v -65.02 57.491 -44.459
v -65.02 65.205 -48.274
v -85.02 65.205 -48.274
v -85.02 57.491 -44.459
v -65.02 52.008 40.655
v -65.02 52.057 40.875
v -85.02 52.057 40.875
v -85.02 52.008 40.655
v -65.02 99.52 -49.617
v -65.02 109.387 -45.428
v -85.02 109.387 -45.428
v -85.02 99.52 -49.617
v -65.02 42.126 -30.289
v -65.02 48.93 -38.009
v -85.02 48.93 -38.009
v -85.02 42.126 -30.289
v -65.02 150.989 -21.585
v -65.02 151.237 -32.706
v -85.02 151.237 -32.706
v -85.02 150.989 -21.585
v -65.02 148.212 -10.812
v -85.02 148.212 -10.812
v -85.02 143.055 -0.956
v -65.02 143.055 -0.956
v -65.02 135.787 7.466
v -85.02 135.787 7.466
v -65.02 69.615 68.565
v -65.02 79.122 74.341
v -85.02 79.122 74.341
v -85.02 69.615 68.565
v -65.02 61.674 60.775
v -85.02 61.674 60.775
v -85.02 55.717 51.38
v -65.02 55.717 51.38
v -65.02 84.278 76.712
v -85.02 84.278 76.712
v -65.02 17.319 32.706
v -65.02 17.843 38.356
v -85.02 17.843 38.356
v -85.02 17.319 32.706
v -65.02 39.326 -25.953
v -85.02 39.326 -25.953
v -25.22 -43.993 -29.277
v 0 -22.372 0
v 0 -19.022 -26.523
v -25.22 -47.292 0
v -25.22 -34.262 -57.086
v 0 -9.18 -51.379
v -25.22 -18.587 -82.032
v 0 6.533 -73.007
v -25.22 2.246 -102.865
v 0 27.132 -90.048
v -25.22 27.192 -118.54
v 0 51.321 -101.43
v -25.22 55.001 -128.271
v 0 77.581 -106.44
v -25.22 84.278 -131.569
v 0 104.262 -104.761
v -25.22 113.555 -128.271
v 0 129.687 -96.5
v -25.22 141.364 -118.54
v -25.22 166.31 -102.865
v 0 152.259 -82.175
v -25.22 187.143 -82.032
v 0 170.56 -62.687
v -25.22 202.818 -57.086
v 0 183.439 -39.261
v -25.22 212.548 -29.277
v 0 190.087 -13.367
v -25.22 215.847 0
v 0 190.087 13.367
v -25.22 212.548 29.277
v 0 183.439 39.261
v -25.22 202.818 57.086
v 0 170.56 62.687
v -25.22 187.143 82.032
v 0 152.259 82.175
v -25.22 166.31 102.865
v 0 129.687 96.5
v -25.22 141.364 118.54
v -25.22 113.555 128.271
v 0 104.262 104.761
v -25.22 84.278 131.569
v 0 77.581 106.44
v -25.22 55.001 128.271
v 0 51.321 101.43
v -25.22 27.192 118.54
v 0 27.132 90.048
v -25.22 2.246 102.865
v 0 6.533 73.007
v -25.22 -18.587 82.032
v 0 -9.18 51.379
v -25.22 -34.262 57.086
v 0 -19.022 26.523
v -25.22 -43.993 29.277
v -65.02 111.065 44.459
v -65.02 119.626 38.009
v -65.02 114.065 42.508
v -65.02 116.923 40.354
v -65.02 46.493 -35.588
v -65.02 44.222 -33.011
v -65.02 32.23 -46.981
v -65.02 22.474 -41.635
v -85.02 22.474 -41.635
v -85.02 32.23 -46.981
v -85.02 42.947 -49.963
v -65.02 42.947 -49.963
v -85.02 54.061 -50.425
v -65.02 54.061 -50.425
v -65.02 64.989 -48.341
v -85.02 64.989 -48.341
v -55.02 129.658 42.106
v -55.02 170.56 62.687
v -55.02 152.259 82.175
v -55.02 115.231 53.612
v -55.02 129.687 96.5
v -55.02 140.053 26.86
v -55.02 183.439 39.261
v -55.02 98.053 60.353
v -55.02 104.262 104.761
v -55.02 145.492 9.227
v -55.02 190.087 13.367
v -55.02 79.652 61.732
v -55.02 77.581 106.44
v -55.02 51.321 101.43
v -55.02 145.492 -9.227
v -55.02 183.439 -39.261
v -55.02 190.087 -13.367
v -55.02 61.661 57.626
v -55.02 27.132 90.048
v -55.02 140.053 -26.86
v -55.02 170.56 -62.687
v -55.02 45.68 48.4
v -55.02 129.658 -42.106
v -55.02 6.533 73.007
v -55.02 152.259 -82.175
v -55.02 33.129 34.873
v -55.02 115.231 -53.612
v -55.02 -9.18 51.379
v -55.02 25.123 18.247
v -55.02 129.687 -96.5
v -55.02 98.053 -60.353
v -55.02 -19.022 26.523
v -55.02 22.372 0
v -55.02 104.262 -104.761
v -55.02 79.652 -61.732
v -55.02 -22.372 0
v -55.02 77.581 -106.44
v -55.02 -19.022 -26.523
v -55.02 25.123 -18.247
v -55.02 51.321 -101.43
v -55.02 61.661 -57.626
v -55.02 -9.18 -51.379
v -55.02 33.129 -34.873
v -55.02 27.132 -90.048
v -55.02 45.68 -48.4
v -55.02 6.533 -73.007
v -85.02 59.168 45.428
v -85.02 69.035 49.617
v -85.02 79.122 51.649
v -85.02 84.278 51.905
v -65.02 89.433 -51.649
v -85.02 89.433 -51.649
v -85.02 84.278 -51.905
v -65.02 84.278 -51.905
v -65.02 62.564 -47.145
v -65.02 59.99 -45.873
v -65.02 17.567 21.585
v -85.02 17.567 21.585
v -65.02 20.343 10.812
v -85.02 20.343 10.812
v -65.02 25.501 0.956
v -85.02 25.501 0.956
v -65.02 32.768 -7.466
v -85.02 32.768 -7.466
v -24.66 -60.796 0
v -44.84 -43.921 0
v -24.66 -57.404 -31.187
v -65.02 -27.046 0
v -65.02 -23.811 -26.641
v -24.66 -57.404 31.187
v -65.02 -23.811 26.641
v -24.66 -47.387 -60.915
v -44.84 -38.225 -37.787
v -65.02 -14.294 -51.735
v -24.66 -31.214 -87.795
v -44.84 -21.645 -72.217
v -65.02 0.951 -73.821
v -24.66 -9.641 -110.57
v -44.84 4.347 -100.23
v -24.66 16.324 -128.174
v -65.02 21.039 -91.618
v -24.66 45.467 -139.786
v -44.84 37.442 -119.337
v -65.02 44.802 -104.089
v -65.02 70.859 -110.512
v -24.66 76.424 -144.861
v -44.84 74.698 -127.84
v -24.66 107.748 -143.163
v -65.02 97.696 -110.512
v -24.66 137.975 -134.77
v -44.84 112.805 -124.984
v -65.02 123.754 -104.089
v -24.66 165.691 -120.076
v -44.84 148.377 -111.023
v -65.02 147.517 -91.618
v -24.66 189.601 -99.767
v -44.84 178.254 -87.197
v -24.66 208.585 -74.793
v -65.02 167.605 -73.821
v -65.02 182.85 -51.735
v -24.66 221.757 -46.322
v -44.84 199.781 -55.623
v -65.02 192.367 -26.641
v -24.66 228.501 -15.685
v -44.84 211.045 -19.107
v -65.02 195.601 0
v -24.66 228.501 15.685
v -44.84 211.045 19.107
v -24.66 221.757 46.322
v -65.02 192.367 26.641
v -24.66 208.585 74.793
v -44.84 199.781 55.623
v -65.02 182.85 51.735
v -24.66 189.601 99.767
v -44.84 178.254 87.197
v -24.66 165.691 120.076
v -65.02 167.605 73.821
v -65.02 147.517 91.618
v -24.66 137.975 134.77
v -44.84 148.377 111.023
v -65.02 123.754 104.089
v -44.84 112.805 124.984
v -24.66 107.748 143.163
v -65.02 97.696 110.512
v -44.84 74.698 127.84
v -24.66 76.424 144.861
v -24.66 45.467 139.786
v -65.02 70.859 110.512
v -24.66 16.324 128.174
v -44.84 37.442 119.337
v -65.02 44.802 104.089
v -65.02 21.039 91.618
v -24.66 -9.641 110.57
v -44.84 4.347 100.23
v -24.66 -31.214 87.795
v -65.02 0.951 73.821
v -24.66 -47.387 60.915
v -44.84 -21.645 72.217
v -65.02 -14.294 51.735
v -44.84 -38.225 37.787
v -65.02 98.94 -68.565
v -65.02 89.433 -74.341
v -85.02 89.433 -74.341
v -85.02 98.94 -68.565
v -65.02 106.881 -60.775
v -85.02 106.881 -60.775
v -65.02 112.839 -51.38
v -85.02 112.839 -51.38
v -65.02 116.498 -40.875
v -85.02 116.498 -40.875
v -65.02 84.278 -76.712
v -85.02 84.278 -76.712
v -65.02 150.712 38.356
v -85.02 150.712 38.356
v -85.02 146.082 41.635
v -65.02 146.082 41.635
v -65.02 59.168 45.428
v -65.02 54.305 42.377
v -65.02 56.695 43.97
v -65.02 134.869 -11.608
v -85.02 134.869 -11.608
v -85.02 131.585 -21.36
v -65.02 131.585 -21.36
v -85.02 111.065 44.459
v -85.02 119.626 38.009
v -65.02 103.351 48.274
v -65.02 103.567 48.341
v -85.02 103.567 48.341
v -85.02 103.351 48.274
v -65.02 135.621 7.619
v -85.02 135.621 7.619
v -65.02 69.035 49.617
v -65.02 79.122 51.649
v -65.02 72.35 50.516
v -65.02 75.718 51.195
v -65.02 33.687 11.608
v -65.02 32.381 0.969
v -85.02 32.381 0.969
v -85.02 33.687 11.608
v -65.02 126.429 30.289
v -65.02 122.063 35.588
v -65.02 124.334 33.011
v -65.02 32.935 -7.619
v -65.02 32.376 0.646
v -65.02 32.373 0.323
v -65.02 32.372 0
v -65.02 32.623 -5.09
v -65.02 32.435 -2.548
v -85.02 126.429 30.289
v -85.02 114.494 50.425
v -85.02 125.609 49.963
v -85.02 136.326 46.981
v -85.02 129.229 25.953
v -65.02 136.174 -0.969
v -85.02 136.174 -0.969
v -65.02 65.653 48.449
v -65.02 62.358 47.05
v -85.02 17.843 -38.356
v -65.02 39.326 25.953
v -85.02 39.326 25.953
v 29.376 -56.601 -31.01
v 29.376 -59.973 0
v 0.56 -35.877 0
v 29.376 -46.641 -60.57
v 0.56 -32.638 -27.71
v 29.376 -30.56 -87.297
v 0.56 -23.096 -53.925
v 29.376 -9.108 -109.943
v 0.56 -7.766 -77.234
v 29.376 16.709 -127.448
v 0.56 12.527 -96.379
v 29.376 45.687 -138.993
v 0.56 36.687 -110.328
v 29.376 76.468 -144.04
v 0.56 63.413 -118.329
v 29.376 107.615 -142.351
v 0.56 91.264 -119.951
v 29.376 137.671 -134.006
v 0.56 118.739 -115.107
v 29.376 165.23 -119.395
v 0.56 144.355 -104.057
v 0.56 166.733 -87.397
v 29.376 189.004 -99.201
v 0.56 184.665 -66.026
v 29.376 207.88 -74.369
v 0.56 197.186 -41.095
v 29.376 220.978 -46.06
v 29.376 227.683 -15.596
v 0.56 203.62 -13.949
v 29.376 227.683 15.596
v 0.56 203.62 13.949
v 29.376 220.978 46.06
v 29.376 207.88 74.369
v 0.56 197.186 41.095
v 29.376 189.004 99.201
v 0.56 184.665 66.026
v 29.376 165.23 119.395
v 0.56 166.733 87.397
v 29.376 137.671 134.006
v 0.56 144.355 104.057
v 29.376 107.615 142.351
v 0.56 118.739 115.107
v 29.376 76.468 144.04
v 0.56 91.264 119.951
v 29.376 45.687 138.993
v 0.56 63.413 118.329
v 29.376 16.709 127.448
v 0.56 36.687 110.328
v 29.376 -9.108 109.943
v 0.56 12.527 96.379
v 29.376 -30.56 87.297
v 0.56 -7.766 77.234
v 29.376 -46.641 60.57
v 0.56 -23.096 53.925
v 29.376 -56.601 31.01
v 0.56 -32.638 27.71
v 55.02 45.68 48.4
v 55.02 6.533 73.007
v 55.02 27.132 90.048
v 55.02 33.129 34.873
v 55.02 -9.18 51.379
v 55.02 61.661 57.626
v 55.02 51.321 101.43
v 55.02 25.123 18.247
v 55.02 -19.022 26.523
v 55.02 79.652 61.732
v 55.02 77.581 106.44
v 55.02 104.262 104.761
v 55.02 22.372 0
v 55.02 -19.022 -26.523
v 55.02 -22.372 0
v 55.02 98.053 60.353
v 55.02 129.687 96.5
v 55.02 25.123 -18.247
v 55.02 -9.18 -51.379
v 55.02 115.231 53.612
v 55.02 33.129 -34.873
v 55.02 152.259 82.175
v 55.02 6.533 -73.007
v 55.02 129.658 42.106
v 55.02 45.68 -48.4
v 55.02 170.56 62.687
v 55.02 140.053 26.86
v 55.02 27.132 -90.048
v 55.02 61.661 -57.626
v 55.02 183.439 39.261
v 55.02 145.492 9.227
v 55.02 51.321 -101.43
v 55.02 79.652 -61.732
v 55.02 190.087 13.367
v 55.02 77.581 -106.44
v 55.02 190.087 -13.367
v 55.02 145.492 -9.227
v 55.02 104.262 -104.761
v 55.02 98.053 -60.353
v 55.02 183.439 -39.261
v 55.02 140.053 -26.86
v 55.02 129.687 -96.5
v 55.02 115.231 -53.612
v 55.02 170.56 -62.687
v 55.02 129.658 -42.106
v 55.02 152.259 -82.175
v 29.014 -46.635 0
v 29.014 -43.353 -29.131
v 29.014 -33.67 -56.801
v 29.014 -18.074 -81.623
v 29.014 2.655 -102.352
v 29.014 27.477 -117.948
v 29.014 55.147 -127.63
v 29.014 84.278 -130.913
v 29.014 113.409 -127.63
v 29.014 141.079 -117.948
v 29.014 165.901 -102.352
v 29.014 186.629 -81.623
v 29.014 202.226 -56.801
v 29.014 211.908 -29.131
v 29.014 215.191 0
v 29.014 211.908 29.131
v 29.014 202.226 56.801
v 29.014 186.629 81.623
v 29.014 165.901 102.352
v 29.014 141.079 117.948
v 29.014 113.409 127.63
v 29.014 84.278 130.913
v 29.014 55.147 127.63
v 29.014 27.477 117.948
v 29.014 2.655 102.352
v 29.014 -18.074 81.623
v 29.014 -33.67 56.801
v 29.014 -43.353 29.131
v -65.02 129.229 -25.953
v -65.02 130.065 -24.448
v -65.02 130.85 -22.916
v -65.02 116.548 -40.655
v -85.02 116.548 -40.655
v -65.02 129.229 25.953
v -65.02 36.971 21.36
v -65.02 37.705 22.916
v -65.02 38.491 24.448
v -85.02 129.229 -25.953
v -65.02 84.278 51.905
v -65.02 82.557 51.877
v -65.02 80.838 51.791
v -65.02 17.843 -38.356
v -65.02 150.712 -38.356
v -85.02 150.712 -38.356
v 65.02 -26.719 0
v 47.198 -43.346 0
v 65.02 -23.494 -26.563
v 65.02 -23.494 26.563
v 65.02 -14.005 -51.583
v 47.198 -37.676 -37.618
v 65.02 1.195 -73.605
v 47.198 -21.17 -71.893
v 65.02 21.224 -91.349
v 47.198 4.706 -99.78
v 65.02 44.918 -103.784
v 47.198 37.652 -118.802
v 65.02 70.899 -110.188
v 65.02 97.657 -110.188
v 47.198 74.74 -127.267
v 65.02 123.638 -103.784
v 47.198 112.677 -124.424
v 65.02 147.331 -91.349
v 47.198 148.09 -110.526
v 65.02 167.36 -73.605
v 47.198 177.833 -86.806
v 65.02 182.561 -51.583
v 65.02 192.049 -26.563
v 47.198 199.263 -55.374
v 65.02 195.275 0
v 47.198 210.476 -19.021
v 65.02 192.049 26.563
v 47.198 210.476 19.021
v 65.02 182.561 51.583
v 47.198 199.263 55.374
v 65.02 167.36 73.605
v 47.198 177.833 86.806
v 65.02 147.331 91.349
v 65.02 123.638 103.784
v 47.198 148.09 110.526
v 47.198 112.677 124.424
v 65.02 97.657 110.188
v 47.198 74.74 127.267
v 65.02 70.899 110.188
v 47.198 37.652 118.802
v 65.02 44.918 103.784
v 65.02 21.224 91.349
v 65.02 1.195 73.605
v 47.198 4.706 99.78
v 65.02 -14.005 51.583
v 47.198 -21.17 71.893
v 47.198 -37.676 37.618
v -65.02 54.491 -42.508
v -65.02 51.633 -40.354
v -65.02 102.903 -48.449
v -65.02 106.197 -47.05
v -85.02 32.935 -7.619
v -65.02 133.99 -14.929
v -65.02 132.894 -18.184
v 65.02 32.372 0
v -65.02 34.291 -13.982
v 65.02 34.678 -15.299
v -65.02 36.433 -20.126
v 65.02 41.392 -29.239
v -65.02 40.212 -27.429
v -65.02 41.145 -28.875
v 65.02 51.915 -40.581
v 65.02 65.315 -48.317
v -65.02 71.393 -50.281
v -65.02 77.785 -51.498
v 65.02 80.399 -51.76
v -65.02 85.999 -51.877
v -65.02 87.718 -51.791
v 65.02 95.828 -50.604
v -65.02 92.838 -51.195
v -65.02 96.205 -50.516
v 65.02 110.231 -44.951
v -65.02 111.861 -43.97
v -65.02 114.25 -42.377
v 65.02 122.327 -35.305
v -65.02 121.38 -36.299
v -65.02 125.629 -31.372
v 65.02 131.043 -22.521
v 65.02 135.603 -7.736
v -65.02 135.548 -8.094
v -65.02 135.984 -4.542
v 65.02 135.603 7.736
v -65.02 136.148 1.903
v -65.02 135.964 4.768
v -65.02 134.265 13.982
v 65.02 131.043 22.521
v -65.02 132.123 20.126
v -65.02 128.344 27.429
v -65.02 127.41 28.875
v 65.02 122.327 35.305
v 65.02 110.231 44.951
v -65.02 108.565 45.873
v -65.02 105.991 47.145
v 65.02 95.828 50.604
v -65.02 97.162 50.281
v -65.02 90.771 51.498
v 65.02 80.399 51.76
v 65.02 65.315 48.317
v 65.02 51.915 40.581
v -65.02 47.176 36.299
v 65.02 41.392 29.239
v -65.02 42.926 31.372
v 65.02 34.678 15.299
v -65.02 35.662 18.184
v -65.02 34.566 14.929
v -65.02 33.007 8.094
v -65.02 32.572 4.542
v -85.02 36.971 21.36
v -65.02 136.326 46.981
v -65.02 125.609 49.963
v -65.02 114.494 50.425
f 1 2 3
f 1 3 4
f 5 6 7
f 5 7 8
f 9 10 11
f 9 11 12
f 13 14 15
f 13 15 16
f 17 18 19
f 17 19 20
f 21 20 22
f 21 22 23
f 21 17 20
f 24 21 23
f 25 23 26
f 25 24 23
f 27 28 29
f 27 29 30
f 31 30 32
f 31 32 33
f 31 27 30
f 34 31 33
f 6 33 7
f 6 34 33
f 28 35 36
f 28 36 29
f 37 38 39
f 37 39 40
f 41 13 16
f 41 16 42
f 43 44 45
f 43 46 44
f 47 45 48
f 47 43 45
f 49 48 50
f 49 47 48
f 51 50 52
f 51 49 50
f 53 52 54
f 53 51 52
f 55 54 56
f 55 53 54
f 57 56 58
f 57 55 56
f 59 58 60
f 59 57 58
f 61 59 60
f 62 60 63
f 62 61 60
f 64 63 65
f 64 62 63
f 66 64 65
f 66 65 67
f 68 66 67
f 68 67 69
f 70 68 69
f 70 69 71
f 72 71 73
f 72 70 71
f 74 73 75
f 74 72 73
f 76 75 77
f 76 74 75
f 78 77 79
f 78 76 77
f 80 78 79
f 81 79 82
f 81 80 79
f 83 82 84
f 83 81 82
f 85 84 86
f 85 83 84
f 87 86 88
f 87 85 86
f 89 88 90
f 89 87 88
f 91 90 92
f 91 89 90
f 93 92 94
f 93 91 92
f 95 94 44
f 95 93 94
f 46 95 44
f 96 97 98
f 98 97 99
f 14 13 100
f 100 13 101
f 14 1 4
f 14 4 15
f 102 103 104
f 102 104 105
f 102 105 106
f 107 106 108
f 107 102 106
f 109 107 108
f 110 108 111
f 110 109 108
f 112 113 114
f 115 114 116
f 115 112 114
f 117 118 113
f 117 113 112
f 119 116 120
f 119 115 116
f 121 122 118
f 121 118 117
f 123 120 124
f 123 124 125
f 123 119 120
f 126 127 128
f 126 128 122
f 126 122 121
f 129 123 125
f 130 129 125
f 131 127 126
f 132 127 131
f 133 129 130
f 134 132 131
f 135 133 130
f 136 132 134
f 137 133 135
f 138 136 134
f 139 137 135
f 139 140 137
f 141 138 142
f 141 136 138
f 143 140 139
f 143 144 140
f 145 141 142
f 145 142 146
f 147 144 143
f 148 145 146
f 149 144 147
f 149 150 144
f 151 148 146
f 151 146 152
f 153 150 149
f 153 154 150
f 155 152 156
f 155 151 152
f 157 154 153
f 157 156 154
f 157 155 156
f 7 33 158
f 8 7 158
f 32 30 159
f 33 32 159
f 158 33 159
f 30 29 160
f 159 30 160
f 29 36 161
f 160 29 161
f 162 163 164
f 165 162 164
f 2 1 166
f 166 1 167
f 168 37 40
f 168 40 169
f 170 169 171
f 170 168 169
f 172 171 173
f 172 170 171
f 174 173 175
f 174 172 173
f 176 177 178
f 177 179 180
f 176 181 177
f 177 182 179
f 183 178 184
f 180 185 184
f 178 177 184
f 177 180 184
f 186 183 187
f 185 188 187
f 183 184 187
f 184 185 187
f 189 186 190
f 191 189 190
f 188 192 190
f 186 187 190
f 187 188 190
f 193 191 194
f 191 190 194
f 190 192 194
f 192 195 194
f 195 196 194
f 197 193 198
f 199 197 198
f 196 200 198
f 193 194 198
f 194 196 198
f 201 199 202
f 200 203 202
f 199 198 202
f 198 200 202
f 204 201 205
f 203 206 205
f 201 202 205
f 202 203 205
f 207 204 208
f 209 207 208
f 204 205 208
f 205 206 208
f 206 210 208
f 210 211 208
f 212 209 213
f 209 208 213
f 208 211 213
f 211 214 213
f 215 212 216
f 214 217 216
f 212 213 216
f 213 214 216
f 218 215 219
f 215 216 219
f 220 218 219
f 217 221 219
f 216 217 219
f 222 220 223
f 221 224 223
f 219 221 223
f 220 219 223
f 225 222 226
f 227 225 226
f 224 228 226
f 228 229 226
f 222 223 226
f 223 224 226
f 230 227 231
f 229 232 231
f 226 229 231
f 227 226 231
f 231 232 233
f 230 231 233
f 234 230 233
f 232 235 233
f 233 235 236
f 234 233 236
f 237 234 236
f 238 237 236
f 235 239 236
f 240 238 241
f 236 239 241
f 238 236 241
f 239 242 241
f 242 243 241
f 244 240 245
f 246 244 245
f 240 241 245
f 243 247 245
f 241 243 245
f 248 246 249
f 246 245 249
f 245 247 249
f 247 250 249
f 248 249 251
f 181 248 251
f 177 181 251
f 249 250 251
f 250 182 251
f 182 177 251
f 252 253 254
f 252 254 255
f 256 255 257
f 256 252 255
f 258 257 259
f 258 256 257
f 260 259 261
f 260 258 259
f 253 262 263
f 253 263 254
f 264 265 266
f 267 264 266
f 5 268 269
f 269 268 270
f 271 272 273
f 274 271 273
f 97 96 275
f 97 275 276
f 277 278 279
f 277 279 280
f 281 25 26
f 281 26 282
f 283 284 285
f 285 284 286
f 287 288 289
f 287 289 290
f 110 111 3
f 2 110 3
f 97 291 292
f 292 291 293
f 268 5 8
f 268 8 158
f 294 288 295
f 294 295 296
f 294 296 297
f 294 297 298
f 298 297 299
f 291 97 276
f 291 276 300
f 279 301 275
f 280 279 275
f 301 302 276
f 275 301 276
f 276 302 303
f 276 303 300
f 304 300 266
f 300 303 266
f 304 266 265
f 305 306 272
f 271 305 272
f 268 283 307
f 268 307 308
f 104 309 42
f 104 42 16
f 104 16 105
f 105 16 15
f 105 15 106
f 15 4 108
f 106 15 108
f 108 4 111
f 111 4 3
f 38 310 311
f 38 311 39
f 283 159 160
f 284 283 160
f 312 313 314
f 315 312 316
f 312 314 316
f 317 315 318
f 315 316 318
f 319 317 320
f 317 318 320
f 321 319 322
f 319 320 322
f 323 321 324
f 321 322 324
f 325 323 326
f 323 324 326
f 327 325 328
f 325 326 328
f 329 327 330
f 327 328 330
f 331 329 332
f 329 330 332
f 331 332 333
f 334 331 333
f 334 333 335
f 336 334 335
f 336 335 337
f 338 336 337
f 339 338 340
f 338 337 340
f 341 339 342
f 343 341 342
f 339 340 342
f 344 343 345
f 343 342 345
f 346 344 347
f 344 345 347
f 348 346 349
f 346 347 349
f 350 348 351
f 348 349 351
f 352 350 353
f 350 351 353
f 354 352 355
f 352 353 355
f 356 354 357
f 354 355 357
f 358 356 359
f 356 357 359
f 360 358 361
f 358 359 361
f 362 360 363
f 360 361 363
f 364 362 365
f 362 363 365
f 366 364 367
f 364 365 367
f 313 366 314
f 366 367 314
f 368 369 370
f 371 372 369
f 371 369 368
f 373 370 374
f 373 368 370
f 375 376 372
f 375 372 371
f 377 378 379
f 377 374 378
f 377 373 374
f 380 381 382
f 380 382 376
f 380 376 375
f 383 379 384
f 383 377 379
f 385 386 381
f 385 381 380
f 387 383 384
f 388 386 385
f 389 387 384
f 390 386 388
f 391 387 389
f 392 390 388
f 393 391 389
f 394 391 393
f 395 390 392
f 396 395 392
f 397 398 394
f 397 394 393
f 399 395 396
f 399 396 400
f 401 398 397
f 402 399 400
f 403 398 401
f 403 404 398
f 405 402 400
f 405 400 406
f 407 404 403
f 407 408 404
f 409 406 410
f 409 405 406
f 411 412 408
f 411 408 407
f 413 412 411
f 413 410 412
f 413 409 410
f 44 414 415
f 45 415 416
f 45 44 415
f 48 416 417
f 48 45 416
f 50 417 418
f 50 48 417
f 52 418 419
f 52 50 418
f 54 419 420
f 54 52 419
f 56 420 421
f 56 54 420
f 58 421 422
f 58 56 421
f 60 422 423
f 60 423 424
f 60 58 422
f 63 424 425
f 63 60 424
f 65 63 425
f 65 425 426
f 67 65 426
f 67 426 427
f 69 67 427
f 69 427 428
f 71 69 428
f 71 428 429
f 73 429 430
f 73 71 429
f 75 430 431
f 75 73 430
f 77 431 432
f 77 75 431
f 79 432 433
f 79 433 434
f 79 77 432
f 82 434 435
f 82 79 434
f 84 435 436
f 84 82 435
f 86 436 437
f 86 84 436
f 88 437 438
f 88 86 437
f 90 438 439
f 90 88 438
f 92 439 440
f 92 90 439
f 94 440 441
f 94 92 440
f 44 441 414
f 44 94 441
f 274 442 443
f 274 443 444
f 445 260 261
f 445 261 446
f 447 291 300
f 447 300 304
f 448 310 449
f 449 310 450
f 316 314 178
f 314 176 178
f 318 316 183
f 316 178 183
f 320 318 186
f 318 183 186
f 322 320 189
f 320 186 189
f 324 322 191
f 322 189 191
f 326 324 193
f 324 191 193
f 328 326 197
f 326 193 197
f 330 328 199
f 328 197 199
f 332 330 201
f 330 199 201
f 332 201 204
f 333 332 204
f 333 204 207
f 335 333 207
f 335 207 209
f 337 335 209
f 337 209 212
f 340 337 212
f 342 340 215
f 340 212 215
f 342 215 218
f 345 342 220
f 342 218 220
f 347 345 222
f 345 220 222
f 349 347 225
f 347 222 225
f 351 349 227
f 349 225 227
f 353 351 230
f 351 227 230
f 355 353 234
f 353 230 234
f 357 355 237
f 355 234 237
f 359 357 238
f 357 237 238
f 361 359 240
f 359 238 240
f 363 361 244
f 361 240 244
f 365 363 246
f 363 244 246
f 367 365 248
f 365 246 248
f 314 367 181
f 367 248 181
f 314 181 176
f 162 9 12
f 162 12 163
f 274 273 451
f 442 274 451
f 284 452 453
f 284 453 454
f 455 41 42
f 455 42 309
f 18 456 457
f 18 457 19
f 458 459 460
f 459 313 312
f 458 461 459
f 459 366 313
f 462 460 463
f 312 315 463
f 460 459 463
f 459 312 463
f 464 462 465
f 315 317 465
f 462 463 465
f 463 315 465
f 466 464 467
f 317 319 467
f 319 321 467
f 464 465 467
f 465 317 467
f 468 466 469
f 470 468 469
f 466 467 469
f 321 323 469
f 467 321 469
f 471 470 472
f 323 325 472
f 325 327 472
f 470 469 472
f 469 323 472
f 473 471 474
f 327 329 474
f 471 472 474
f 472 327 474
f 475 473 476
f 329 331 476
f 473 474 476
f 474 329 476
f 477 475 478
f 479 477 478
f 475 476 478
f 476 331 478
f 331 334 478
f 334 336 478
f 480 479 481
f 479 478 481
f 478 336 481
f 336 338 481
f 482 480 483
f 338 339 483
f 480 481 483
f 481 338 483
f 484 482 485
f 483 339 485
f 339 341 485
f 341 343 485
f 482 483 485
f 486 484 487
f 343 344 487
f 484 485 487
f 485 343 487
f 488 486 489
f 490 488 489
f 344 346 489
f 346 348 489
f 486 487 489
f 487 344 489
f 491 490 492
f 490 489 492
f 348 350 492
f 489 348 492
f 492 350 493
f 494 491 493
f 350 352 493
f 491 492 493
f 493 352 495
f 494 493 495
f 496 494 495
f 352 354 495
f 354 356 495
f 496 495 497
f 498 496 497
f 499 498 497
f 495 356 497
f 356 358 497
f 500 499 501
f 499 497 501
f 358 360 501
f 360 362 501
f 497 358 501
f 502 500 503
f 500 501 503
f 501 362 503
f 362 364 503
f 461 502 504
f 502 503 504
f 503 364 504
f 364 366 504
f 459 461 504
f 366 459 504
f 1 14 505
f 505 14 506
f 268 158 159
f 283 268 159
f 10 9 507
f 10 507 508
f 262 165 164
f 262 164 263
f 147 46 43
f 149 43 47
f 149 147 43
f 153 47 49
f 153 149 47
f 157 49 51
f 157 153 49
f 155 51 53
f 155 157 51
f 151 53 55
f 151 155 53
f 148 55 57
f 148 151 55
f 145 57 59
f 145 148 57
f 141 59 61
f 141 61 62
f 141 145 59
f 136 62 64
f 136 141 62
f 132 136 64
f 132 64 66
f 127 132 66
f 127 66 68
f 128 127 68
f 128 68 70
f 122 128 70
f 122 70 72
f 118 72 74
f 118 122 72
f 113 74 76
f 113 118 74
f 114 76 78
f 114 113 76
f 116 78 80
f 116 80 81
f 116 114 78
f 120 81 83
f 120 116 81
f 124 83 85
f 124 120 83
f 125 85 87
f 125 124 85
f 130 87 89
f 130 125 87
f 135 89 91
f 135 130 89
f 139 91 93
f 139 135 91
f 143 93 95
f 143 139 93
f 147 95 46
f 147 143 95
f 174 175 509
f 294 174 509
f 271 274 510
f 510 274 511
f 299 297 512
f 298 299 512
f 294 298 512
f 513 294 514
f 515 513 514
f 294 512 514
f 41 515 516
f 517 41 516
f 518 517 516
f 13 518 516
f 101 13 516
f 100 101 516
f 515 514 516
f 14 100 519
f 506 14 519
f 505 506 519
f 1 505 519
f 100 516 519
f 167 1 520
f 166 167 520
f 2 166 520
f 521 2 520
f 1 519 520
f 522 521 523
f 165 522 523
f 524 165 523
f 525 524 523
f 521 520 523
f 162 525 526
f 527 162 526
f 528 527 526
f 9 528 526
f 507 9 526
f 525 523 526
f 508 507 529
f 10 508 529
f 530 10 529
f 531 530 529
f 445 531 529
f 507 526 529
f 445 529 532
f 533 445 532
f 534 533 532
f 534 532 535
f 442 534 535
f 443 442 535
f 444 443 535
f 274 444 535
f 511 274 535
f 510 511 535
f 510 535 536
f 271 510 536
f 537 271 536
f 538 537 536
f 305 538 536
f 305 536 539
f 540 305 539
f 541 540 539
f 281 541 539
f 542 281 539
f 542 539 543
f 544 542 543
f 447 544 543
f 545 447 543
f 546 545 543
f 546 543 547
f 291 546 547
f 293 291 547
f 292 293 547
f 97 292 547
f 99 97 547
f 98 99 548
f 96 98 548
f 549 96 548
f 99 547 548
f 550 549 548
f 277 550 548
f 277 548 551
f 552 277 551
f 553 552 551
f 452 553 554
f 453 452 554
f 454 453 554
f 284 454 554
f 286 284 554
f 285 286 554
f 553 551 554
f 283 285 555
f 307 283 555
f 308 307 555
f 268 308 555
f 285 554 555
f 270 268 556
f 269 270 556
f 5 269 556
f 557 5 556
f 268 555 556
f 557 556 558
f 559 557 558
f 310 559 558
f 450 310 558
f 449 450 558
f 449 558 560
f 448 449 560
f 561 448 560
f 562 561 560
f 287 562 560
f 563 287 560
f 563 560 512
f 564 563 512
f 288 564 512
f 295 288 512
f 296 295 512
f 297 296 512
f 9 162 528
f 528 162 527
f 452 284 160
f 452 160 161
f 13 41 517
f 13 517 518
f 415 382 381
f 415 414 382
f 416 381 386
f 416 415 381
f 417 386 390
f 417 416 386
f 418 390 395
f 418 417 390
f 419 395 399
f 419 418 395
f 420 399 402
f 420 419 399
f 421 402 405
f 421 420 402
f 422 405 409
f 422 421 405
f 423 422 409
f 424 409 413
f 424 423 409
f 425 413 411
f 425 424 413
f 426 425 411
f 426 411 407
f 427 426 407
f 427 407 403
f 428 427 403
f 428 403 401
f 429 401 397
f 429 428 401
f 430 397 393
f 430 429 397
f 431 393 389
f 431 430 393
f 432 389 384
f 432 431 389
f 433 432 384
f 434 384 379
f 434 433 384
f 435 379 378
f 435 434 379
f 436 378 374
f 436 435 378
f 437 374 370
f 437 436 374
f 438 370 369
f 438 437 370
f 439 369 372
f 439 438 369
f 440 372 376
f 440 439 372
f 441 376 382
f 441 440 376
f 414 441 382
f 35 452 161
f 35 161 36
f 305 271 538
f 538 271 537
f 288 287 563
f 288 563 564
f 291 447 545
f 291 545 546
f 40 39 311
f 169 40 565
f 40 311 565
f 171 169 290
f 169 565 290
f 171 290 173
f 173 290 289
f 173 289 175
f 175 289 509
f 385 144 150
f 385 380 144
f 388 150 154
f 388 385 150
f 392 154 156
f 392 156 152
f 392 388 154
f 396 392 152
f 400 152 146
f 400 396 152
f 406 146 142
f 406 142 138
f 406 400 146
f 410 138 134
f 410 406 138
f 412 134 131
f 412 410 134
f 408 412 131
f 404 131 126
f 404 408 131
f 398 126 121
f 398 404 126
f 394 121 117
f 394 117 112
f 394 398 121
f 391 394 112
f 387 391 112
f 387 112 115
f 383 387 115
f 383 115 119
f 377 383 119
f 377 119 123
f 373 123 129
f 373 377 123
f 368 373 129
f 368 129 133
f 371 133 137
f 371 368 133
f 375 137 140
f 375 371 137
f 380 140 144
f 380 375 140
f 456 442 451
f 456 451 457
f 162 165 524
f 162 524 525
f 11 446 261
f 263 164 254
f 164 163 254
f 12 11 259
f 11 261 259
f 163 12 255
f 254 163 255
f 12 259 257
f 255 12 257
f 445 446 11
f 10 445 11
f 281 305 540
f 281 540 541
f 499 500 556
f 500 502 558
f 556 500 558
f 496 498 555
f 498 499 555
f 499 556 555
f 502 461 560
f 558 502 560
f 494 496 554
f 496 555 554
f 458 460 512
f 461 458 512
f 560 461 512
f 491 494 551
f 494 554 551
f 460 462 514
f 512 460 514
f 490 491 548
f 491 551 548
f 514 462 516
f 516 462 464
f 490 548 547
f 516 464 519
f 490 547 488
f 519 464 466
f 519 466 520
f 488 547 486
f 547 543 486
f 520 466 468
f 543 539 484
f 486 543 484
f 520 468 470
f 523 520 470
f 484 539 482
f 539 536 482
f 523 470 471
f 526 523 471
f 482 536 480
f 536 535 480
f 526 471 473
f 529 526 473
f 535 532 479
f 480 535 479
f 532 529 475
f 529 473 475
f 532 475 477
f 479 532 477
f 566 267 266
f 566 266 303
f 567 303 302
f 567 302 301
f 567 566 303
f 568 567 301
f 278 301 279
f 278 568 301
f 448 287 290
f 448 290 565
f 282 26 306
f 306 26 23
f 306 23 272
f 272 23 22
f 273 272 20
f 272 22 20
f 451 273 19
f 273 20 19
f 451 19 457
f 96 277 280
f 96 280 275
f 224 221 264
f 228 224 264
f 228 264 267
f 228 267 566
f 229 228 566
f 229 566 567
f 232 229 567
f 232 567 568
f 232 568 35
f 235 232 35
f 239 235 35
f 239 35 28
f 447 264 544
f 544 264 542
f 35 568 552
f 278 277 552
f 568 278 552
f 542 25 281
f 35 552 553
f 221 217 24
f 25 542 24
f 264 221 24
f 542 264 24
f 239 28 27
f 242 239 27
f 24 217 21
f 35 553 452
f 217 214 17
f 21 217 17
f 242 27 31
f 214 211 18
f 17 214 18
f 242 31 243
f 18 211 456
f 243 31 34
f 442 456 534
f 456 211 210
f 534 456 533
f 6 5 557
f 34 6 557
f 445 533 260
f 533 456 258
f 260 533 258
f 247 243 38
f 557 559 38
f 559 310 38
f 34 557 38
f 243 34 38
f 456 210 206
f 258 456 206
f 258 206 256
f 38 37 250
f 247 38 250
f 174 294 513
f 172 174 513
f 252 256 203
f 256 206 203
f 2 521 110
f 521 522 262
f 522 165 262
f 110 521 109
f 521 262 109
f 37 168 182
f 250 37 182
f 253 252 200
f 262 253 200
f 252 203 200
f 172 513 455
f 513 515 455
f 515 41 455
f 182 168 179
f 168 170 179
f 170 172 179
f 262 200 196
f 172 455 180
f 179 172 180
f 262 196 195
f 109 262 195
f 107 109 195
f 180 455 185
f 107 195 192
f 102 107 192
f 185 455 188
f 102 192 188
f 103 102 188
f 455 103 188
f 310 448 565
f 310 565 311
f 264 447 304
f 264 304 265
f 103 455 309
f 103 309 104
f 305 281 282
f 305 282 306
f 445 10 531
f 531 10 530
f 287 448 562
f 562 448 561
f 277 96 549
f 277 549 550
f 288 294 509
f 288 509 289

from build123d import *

# Parameters (mm, degrees)
BOSS_EXTRUDE3_DEPTH = 20


with BuildPart() as part:
    # Sketch1 → Revolve-Thin2 (revolve)
    with BuildSketch(Plane.XY):
        Polygon((29.376248058, -59.973392874), (0.560391904, -35.876681975), (-24.659832096, -60.795812358), (-65.01956382, -27.045755372), (-65.01956382, 32.372412999), (65.01956382, 32.372412999), (65.01956382, -26.719075047), align=None)
        Polygon((29.014074927, -46.634880572), (0, -22.372412999), (-25.220224001, -47.291543383), (-55.01956382, -22.372412999), (-55.01956382, 22.372412999), (55.01956382, 22.372412999), (55.01956382, -22.372412999), align=None, mode=Mode.SUBTRACT)
    revolve(axis=Axis((-55.01956382, 84.277813771, 0), (1, 0, 0)))

    # Sketch2 → Boss-Extrude3 (add)
    with BuildSketch(Plane.ZY.offset(65.01956382)):
        with BuildLine():
            Line((-51.905400772, 84.277813771), (-76.712133876, 84.277813771))
            Line((-76.712133876, 84.277813771), (-74.341443656, 89.433234307))
            ThreePointArc((-74.341443656, 89.433234307), (-60.775134761, 106.881443528), (-40.875379676, 116.498329179))
            Line((-40.875379676, 116.498329179), (-40.654960426, 116.547688609))
            Line((-40.654960426, 116.547688609), (-45.427875958, 109.387148992))
            Line((-45.427875958, 109.387148992), (-49.616909483, 99.520284788))
            Line((-49.616909483, 99.520284788), (-51.648739272, 89.433234307))
            Line((-51.648739272, 89.433234307), (-51.905400772, 84.277813771))
        make_face()
        with BuildLine():
            Line((-25.952700386, 129.229209434), (-38.356066938, 150.712470486))
            Line((-38.356066938, 150.712470486), (-32.705996677, 151.2371028))
            ThreePointArc((-32.705996677, 151.2371028), (-10.812249793, 148.212439271), (7.466095028, 135.787188664))
            Line((7.466095028, 135.787188664), (7.619051174, 135.620979709))
            Line((7.619051174, 135.620979709), (-0.968615806, 136.174176002))
            Line((-0.968615806, 136.174176002), (-11.608087624, 134.868553349))
            Line((-11.608087624, 134.868553349), (-21.359644485, 131.584644322))
            Line((-21.359644485, 131.584644322), (-25.952700386, 129.229209434))
        make_face()
        with BuildLine():
            Line((25.952700386, 129.229209434), (38.356066938, 150.712470486))
            Line((38.356066938, 150.712470486), (41.635446979, 146.081682264))
            ThreePointArc((41.635446979, 146.081682264), (49.962884968, 125.608809514), (48.341474704, 103.566673256))
            Line((48.341474704, 103.566673256), (48.2740116, 103.351104871))
            Line((48.2740116, 103.351104871), (44.459260153, 111.064840781))
            Line((44.459260153, 111.064840781), (38.008821859, 119.626082332))
            Line((38.008821859, 119.626082332), (30.289094787, 126.429223787))
            Line((30.289094787, 126.429223787), (25.952700386, 129.229209434))
        make_face()
        with BuildLine():
            Line((51.905400772, 84.277813771), (76.712133876, 84.277813771))
            Line((76.712133876, 84.277813771), (74.341443656, 79.122393235))
            ThreePointArc((74.341443656, 79.122393235), (60.775134761, 61.674184014), (40.875379676, 52.057298364))
            Line((40.875379676, 52.057298364), (40.654960426, 52.007938933))
            Line((40.654960426, 52.007938933), (45.427875958, 59.16847855))
            Line((45.427875958, 59.16847855), (49.616909483, 69.035342754))
            Line((49.616909483, 69.035342754), (51.648739272, 79.122393235))
            Line((51.648739272, 79.122393235), (51.905400772, 84.277813771))
        make_face()
        with BuildLine():
            Line((25.952700386, 39.326418109), (38.356066938, 17.843157056))
            Line((38.356066938, 17.843157056), (32.705996677, 17.318524743))
            ThreePointArc((32.705996677, 17.318524743), (10.812249793, 20.343188271), (-7.466095028, 32.768438879))
            Line((-7.466095028, 32.768438879), (-7.619051174, 32.934647833))
            Line((-7.619051174, 32.934647833), (0.968615806, 32.381451541))
            Line((0.968615806, 32.381451541), (11.608087624, 33.687074193))
            Line((11.608087624, 33.687074193), (21.359644485, 36.97098322))
            Line((21.359644485, 36.97098322), (25.952700386, 39.326418109))
        make_face()
        with BuildLine():
            Line((-25.952700386, 39.326418109), (-38.356066938, 17.843157056))
            Line((-38.356066938, 17.843157056), (-41.635446979, 22.473945279))
            ThreePointArc((-41.635446979, 22.473945279), (-49.962884968, 42.946818028), (-48.341474704, 64.988954286))
            Line((-48.341474704, 64.988954286), (-48.2740116, 65.204522671))
            Line((-48.2740116, 65.204522671), (-44.459260153, 57.490786762))
            Line((-44.459260153, 57.490786762), (-38.008821859, 48.929545211))
            Line((-38.008821859, 48.929545211), (-30.289094787, 42.126403756))
            Line((-30.289094787, 42.126403756), (-25.952700386, 39.326418109))
        make_face()
    extrude(amount=BOSS_EXTRUDE3_DEPTH)


solid = part.part
